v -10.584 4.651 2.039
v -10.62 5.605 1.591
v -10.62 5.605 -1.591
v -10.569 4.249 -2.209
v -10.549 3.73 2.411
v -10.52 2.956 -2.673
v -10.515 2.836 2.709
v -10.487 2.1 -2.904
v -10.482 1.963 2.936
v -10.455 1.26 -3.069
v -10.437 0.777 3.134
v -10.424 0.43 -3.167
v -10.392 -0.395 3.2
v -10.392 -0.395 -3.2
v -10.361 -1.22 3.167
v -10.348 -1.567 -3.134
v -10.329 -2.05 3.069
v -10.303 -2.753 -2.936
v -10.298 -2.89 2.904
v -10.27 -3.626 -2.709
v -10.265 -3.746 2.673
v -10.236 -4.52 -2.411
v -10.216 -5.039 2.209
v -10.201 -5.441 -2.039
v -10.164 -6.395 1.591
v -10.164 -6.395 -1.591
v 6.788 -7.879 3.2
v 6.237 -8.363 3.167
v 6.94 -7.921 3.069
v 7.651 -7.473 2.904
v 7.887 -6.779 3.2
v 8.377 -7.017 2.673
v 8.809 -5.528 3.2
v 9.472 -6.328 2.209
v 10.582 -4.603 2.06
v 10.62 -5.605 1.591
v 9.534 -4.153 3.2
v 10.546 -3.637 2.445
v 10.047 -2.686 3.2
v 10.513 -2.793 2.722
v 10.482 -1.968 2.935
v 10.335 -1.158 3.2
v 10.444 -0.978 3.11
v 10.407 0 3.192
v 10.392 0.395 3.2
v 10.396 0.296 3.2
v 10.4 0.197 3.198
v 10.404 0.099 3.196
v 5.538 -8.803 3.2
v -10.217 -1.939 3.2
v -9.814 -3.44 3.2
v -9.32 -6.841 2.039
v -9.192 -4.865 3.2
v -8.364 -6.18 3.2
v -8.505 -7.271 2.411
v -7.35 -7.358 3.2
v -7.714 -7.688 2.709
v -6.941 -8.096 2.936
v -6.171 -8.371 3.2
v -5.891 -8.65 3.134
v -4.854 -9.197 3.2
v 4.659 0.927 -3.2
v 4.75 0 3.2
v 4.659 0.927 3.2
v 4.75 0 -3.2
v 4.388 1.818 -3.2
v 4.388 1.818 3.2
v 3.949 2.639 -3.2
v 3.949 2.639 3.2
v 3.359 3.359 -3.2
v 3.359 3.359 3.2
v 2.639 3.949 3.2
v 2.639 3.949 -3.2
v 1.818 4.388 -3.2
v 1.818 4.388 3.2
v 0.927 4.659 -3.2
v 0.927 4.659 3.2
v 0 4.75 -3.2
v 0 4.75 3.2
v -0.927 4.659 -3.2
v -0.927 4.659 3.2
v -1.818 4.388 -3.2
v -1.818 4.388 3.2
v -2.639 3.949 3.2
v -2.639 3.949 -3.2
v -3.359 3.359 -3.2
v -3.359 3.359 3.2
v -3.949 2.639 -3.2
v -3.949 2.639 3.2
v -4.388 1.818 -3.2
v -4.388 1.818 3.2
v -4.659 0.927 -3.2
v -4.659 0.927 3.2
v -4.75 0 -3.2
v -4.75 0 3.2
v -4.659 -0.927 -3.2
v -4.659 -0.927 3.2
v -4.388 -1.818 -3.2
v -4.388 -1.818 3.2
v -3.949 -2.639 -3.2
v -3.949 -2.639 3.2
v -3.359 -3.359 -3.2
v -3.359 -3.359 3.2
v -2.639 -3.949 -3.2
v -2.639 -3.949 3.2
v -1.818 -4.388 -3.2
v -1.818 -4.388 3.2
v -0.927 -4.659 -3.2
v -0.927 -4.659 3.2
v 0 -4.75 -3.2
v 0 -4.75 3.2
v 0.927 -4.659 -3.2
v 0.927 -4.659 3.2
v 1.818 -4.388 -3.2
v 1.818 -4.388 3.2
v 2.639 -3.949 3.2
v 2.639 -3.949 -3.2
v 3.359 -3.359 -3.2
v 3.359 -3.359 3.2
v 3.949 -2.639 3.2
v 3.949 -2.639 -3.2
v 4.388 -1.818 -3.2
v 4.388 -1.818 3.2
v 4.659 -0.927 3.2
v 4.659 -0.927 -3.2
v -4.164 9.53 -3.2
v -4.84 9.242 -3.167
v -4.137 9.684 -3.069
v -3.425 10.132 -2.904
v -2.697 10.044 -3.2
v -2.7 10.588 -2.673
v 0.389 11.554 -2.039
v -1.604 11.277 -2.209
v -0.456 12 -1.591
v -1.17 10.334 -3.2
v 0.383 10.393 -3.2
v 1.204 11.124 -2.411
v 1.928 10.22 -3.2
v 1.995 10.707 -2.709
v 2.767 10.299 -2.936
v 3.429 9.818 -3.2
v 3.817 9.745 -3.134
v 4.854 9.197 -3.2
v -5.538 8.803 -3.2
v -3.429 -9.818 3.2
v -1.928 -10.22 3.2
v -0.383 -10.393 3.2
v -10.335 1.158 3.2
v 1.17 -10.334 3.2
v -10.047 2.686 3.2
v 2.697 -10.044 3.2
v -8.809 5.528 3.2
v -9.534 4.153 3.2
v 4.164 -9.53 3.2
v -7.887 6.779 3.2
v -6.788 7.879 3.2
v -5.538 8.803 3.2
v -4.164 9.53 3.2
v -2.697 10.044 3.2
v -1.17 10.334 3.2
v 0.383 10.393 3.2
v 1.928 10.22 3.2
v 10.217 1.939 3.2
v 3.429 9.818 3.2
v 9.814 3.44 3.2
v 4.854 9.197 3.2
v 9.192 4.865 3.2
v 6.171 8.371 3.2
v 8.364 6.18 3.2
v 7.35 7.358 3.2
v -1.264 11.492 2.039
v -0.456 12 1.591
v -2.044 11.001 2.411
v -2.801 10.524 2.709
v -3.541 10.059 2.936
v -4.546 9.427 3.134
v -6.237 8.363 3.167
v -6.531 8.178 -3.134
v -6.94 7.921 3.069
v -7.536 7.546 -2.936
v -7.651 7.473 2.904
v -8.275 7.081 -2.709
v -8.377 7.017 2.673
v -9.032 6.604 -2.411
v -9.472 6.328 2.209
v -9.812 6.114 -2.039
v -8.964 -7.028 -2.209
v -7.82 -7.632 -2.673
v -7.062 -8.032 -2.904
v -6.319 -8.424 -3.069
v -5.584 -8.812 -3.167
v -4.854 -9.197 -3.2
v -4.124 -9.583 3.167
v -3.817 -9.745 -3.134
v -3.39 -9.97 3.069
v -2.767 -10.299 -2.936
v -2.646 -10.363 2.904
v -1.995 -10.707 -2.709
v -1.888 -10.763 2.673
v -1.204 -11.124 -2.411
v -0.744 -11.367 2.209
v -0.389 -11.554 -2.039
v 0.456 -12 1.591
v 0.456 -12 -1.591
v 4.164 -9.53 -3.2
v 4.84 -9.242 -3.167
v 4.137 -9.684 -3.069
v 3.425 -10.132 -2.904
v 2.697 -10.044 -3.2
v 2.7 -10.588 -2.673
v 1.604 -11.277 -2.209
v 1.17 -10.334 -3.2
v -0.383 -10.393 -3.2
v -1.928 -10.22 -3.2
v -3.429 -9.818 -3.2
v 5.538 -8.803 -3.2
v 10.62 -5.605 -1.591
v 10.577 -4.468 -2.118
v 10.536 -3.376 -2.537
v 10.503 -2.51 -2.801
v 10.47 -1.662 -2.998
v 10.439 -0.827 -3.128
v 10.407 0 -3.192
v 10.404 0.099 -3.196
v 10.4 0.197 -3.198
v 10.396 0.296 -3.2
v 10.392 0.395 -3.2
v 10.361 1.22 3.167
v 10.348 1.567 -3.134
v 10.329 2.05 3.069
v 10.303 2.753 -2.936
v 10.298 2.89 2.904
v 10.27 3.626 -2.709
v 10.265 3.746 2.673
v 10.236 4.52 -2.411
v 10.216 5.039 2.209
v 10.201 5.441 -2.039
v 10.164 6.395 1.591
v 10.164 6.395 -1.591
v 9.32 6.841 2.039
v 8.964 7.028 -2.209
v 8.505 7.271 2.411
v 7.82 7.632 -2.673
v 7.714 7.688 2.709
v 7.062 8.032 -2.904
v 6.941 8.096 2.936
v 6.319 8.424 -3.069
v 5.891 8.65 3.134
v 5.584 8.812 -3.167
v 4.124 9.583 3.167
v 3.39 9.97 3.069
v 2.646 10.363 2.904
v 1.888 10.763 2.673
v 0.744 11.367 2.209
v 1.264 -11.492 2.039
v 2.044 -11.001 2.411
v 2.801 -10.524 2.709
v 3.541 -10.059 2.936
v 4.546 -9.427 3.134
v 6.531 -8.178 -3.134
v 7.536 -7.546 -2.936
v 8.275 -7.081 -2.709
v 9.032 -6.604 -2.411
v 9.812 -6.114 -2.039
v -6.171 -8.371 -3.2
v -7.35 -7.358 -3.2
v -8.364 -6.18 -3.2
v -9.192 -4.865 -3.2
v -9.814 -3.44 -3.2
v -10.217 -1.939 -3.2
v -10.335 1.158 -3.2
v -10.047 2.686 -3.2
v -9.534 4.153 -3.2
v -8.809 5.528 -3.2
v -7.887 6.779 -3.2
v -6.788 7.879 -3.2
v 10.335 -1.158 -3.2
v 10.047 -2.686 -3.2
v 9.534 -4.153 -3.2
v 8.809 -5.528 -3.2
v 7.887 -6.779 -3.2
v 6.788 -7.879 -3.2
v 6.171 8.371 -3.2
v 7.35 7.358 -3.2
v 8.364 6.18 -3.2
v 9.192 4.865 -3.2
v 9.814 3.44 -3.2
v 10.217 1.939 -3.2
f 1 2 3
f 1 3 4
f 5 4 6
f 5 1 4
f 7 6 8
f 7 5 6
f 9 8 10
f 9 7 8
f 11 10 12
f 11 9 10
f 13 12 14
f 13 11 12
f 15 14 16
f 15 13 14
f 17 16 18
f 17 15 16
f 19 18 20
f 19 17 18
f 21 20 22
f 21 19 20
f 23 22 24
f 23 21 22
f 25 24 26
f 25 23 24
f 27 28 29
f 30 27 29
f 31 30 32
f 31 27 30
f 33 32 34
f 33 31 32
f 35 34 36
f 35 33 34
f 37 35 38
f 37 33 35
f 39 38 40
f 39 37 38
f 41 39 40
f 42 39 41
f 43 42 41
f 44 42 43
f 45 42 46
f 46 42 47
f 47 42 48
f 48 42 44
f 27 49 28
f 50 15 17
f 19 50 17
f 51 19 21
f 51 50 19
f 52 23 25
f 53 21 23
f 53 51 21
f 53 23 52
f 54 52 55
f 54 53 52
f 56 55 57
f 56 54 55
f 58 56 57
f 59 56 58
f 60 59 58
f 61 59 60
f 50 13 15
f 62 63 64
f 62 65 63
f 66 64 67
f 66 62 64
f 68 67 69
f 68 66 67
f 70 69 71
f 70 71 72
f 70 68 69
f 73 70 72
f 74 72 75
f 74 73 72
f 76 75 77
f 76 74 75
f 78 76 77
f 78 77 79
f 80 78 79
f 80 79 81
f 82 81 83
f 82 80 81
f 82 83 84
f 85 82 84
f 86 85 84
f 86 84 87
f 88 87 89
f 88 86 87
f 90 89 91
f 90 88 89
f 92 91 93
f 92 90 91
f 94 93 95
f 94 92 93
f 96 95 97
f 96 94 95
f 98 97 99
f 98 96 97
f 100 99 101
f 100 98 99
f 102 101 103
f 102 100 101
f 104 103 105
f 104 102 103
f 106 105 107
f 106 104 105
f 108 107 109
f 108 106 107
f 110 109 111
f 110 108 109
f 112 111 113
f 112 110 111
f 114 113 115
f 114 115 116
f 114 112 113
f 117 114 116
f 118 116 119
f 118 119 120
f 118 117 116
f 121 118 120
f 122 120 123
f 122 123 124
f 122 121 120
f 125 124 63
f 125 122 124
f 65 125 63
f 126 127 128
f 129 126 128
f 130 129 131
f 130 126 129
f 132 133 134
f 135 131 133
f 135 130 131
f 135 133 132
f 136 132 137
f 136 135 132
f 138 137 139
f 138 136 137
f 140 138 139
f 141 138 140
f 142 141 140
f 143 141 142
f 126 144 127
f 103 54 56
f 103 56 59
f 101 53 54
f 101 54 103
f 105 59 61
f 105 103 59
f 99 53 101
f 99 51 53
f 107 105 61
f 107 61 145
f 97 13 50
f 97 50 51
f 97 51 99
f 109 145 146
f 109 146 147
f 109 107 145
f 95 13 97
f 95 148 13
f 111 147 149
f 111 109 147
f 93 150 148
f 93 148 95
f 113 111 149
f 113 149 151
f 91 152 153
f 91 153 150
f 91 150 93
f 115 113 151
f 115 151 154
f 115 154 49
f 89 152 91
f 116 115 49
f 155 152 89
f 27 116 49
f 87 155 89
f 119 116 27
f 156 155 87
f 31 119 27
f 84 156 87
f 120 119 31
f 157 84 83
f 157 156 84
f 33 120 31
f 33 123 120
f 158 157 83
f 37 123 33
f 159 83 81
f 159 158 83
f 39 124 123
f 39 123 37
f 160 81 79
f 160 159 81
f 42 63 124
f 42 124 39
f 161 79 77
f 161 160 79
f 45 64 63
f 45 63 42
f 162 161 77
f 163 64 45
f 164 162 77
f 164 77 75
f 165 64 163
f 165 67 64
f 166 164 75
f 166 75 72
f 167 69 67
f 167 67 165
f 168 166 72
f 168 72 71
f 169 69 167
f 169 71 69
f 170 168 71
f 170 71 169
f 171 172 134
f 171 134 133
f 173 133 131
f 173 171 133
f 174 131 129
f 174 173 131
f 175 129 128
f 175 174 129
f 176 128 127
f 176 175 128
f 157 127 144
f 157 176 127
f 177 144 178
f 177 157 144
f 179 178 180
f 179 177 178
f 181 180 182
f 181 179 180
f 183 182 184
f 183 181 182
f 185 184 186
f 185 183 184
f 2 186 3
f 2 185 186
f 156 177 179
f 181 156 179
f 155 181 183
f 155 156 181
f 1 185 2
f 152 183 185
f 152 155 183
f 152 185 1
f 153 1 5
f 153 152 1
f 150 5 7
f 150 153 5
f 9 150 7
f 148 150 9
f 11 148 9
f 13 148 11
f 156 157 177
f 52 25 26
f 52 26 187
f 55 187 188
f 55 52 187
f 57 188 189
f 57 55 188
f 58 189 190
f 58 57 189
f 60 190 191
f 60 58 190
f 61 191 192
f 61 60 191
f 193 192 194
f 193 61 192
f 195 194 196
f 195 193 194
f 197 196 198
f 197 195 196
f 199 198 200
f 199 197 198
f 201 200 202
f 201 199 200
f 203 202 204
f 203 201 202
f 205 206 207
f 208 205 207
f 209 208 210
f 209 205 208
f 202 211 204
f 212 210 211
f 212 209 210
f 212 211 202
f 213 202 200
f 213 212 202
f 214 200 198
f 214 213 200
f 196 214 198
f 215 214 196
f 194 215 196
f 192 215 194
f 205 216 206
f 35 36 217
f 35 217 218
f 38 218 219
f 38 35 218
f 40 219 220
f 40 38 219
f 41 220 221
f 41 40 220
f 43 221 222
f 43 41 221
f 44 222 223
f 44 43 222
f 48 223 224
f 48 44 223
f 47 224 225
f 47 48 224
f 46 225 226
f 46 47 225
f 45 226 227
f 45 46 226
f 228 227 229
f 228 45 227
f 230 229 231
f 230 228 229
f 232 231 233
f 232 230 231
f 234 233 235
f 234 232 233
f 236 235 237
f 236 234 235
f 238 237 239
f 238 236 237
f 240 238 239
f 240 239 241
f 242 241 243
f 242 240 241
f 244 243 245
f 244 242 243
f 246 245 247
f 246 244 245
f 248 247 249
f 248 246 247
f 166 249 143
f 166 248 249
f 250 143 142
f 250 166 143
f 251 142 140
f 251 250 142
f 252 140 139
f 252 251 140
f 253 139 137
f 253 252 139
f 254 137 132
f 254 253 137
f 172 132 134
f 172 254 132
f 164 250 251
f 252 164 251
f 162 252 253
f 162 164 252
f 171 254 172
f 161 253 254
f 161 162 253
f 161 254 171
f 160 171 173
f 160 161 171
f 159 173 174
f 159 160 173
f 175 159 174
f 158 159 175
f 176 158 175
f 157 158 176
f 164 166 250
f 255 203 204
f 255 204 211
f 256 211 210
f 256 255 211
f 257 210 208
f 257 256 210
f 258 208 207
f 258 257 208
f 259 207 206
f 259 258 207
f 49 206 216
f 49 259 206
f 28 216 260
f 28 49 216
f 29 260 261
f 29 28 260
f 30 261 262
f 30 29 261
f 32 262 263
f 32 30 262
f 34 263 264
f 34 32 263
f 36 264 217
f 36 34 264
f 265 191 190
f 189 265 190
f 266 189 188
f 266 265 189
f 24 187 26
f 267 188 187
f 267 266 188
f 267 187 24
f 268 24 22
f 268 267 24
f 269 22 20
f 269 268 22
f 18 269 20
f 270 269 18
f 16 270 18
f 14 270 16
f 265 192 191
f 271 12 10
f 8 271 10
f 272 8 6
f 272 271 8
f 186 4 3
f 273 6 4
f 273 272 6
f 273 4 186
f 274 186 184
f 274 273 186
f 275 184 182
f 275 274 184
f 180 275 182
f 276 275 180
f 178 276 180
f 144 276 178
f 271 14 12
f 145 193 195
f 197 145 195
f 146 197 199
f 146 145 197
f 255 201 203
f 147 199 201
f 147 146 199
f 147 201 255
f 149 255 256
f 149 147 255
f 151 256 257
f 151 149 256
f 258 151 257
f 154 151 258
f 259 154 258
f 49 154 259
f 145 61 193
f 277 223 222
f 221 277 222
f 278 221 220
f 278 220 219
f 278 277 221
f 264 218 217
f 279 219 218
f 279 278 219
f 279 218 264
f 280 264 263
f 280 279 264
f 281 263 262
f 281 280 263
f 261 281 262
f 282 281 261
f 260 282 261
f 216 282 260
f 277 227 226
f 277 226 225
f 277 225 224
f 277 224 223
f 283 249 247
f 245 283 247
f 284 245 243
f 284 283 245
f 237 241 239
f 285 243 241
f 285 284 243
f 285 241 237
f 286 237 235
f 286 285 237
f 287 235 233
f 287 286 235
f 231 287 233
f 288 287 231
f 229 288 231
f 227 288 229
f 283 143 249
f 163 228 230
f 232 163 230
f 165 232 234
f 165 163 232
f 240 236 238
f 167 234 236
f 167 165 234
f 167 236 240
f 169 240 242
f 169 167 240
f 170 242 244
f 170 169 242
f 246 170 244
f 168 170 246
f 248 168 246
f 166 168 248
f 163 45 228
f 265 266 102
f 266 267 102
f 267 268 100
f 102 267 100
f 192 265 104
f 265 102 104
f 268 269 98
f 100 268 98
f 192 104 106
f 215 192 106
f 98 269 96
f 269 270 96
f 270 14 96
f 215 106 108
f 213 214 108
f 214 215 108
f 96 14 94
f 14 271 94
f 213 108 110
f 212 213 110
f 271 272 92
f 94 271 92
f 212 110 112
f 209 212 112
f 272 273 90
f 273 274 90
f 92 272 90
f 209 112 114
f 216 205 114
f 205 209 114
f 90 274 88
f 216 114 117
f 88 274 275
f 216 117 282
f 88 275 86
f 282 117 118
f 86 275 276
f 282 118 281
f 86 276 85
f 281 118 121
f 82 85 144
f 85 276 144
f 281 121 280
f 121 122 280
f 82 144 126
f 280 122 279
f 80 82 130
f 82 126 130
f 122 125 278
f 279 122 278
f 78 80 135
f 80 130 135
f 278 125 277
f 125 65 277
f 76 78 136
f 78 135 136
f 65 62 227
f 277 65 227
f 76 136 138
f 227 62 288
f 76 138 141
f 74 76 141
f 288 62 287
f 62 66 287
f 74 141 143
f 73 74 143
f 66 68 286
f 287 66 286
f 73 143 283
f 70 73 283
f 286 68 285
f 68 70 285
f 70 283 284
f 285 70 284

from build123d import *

# Parameters (mm, degrees)
SKETCH1_R               = 4.75
BOSS_EXTRUDE1_DEPTH     = 3.2
SKETCH2_OUTSIDE_W       = 42.576
SKETCH2_OUTSIDE_H       = 45.336
SKETCH2_OUTSIDE_R       = 10.39980339
CUT_EXTRUDE1_DEPTH      = 6.4
CUT_EXTRUDE1_DRAFT      = -45
MIRROR1_COPY_1_SKETCH_W = 42.576
MIRROR1_COPY_1_SKETCH_H = 45.336
MIRROR1_COPY_1_SKETCH_R = 10.39980339
MIRROR1_COPY_1_DEPTH    = 6.4
MIRROR1_COPY_1_DRAFT    = -45


with BuildPart() as part:
    # Sketch1 → Boss-Extrude1 (new, symmetric)
    with BuildSketch(Plane.XY):
        Polygon((10.620274545, -5.605144899), (10.164335146, 6.394855101), (-0.455939398, 12), (-10.620274545, 5.605144899), (-10.164335146, -6.394855101), (0.455939398, -12), align=None)
        Circle(SKETCH1_R, mode=Mode.SUBTRACT)
    extrude(amount=BOSS_EXTRUDE1_DEPTH, both=True)


with BuildPart() as cut_extrude1_tool:
    # Sketch2 outside → Cut-Extrude1 (with draft: the straight prism first)
    with BuildSketch(Plane.XY.offset(3.2)):
        Rectangle(SKETCH2_OUTSIDE_W, SKETCH2_OUTSIDE_H)
        Circle(SKETCH2_OUTSIDE_R, mode=Mode.SUBTRACT)
    extrude(amount=-CUT_EXTRUDE1_DEPTH)
    # Cut-Extrude1: the draft: its side faces are tilted about the plane it starts from
    cut_extrude1_sides = [cut_extrude1_tool.faces().sort_by_distance(p)[0] for p in [
        (0, -22.668, 0),
        (21.288, 0, 0),
        (0, 22.668, 0),
        (-21.288, 0, 0),
        (-10.39980339, 0, 0),
    ]]
    draft(cut_extrude1_sides, Plane.XY.offset(3.2), CUT_EXTRUDE1_DRAFT)


with BuildPart() as part_1:
    add(part.part)

    # Cut-Extrude1: cut by cut_extrude1_tool
    add(cut_extrude1_tool.part, mode=Mode.SUBTRACT)


with BuildPart() as mirror1_copy_1_tool:
    # Mirror1 copy 1 sketch → Mirror1 copy 1 (with draft: the straight prism first)
    with BuildSketch(Plane(origin=(0, 0, -3.2), x_dir=(1, 0, 0), z_dir=(0, 0, -1))):
        Rectangle(MIRROR1_COPY_1_SKETCH_W, MIRROR1_COPY_1_SKETCH_H)
        Circle(MIRROR1_COPY_1_SKETCH_R, mode=Mode.SUBTRACT)
    extrude(amount=-MIRROR1_COPY_1_DEPTH)
    # Mirror1 copy 1: the draft: its side faces are tilted about the plane it starts from
    mirror1_copy_1_sides = [mirror1_copy_1_tool.faces().sort_by_distance(p)[0] for p in [
        (0, -22.668, 0),
        (21.288, 0, 0),
        (0, 22.668, 0),
        (-21.288, 0, 0),
        (-10.39980339, 0, 0),
    ]]
    draft(mirror1_copy_1_sides, Plane(origin=(0, 0, -3.2), x_dir=(1, 0, 0), z_dir=(0, 0, -1)), MIRROR1_COPY_1_DRAFT)


with BuildPart() as part_2:
    add(part_1.part)

    # Mirror1 copy 1: cut by mirror1_copy_1_tool
    add(mirror1_copy_1_tool.part, mode=Mode.SUBTRACT)


solid = part_2.part
